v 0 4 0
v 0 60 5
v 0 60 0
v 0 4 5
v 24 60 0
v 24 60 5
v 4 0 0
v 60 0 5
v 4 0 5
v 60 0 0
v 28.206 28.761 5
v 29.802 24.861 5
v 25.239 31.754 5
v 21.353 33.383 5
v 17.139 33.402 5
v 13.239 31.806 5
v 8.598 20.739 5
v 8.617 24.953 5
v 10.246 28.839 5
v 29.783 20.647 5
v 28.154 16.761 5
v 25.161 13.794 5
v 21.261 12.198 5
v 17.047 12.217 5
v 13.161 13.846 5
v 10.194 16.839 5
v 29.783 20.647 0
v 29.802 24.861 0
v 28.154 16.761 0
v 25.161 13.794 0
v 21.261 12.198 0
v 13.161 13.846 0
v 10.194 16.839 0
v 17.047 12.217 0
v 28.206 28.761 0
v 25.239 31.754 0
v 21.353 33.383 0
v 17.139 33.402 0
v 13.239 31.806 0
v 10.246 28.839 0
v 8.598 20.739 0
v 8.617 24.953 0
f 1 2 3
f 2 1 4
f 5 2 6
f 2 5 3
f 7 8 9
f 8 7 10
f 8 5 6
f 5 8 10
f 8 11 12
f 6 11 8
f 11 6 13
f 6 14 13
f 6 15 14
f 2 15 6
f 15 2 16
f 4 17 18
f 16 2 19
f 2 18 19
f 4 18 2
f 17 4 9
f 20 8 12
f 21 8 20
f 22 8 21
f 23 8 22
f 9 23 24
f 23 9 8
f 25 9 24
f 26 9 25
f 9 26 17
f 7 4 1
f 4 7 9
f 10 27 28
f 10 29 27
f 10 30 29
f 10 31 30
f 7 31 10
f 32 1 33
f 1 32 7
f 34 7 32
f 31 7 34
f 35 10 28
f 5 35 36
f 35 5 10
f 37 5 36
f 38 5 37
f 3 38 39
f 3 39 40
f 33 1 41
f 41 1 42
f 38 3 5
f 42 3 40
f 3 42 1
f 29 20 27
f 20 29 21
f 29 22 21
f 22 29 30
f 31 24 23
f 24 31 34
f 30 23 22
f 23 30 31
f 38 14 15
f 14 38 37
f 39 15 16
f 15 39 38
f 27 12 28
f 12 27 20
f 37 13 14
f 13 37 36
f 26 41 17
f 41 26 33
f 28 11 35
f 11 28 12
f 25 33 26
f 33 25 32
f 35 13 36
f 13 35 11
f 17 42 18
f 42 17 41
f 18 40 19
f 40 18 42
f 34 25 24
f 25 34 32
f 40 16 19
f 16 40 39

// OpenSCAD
$fn = 32;

// ----------------------------------------------------------------------
// Bracket plate: gusset 60 x 60
// ----------------------------------------------------------------------

// --- parameters (mm) ---
hole_r = 3.5;             // bolt hole radius
plate_t = 5;              // plate thickness, Z (extrusion height)
gus_a = 60;               // base length
gus_b = 60;               // height
top_x = 24;               // top edge X of the angled cut
light_r = 10.8;           // lightening hole radius

light_d = 2 * light_r;

profile = [[4, 0], [30, 0], [60, 0], [24, 60], [0, 60], [0, 4]];  // primary outline, 6 points, counter clockwise
void_1 = [[29.802, 24.861], [28.206, 28.761], [25.239, 31.754], [21.353, 33.383], [17.139, 33.402], [13.239, 31.806], [10.246, 28.839], [8.617, 24.953], [8.598, 20.739], [10.194, 16.839], [13.161, 13.846], [17.047, 12.217], [21.261, 12.198], [25.161, 13.794], [28.154, 16.761], [29.783, 20.647]];  // lightening hole, 16 points

// --- the one profile operation ---
difference() {
  linear_extrude(height = plate_t) polygon(points = profile);
  translate([0, 0, -1])
    linear_extrude(height = plate_t + 2) polygon(points = void_1);
}
